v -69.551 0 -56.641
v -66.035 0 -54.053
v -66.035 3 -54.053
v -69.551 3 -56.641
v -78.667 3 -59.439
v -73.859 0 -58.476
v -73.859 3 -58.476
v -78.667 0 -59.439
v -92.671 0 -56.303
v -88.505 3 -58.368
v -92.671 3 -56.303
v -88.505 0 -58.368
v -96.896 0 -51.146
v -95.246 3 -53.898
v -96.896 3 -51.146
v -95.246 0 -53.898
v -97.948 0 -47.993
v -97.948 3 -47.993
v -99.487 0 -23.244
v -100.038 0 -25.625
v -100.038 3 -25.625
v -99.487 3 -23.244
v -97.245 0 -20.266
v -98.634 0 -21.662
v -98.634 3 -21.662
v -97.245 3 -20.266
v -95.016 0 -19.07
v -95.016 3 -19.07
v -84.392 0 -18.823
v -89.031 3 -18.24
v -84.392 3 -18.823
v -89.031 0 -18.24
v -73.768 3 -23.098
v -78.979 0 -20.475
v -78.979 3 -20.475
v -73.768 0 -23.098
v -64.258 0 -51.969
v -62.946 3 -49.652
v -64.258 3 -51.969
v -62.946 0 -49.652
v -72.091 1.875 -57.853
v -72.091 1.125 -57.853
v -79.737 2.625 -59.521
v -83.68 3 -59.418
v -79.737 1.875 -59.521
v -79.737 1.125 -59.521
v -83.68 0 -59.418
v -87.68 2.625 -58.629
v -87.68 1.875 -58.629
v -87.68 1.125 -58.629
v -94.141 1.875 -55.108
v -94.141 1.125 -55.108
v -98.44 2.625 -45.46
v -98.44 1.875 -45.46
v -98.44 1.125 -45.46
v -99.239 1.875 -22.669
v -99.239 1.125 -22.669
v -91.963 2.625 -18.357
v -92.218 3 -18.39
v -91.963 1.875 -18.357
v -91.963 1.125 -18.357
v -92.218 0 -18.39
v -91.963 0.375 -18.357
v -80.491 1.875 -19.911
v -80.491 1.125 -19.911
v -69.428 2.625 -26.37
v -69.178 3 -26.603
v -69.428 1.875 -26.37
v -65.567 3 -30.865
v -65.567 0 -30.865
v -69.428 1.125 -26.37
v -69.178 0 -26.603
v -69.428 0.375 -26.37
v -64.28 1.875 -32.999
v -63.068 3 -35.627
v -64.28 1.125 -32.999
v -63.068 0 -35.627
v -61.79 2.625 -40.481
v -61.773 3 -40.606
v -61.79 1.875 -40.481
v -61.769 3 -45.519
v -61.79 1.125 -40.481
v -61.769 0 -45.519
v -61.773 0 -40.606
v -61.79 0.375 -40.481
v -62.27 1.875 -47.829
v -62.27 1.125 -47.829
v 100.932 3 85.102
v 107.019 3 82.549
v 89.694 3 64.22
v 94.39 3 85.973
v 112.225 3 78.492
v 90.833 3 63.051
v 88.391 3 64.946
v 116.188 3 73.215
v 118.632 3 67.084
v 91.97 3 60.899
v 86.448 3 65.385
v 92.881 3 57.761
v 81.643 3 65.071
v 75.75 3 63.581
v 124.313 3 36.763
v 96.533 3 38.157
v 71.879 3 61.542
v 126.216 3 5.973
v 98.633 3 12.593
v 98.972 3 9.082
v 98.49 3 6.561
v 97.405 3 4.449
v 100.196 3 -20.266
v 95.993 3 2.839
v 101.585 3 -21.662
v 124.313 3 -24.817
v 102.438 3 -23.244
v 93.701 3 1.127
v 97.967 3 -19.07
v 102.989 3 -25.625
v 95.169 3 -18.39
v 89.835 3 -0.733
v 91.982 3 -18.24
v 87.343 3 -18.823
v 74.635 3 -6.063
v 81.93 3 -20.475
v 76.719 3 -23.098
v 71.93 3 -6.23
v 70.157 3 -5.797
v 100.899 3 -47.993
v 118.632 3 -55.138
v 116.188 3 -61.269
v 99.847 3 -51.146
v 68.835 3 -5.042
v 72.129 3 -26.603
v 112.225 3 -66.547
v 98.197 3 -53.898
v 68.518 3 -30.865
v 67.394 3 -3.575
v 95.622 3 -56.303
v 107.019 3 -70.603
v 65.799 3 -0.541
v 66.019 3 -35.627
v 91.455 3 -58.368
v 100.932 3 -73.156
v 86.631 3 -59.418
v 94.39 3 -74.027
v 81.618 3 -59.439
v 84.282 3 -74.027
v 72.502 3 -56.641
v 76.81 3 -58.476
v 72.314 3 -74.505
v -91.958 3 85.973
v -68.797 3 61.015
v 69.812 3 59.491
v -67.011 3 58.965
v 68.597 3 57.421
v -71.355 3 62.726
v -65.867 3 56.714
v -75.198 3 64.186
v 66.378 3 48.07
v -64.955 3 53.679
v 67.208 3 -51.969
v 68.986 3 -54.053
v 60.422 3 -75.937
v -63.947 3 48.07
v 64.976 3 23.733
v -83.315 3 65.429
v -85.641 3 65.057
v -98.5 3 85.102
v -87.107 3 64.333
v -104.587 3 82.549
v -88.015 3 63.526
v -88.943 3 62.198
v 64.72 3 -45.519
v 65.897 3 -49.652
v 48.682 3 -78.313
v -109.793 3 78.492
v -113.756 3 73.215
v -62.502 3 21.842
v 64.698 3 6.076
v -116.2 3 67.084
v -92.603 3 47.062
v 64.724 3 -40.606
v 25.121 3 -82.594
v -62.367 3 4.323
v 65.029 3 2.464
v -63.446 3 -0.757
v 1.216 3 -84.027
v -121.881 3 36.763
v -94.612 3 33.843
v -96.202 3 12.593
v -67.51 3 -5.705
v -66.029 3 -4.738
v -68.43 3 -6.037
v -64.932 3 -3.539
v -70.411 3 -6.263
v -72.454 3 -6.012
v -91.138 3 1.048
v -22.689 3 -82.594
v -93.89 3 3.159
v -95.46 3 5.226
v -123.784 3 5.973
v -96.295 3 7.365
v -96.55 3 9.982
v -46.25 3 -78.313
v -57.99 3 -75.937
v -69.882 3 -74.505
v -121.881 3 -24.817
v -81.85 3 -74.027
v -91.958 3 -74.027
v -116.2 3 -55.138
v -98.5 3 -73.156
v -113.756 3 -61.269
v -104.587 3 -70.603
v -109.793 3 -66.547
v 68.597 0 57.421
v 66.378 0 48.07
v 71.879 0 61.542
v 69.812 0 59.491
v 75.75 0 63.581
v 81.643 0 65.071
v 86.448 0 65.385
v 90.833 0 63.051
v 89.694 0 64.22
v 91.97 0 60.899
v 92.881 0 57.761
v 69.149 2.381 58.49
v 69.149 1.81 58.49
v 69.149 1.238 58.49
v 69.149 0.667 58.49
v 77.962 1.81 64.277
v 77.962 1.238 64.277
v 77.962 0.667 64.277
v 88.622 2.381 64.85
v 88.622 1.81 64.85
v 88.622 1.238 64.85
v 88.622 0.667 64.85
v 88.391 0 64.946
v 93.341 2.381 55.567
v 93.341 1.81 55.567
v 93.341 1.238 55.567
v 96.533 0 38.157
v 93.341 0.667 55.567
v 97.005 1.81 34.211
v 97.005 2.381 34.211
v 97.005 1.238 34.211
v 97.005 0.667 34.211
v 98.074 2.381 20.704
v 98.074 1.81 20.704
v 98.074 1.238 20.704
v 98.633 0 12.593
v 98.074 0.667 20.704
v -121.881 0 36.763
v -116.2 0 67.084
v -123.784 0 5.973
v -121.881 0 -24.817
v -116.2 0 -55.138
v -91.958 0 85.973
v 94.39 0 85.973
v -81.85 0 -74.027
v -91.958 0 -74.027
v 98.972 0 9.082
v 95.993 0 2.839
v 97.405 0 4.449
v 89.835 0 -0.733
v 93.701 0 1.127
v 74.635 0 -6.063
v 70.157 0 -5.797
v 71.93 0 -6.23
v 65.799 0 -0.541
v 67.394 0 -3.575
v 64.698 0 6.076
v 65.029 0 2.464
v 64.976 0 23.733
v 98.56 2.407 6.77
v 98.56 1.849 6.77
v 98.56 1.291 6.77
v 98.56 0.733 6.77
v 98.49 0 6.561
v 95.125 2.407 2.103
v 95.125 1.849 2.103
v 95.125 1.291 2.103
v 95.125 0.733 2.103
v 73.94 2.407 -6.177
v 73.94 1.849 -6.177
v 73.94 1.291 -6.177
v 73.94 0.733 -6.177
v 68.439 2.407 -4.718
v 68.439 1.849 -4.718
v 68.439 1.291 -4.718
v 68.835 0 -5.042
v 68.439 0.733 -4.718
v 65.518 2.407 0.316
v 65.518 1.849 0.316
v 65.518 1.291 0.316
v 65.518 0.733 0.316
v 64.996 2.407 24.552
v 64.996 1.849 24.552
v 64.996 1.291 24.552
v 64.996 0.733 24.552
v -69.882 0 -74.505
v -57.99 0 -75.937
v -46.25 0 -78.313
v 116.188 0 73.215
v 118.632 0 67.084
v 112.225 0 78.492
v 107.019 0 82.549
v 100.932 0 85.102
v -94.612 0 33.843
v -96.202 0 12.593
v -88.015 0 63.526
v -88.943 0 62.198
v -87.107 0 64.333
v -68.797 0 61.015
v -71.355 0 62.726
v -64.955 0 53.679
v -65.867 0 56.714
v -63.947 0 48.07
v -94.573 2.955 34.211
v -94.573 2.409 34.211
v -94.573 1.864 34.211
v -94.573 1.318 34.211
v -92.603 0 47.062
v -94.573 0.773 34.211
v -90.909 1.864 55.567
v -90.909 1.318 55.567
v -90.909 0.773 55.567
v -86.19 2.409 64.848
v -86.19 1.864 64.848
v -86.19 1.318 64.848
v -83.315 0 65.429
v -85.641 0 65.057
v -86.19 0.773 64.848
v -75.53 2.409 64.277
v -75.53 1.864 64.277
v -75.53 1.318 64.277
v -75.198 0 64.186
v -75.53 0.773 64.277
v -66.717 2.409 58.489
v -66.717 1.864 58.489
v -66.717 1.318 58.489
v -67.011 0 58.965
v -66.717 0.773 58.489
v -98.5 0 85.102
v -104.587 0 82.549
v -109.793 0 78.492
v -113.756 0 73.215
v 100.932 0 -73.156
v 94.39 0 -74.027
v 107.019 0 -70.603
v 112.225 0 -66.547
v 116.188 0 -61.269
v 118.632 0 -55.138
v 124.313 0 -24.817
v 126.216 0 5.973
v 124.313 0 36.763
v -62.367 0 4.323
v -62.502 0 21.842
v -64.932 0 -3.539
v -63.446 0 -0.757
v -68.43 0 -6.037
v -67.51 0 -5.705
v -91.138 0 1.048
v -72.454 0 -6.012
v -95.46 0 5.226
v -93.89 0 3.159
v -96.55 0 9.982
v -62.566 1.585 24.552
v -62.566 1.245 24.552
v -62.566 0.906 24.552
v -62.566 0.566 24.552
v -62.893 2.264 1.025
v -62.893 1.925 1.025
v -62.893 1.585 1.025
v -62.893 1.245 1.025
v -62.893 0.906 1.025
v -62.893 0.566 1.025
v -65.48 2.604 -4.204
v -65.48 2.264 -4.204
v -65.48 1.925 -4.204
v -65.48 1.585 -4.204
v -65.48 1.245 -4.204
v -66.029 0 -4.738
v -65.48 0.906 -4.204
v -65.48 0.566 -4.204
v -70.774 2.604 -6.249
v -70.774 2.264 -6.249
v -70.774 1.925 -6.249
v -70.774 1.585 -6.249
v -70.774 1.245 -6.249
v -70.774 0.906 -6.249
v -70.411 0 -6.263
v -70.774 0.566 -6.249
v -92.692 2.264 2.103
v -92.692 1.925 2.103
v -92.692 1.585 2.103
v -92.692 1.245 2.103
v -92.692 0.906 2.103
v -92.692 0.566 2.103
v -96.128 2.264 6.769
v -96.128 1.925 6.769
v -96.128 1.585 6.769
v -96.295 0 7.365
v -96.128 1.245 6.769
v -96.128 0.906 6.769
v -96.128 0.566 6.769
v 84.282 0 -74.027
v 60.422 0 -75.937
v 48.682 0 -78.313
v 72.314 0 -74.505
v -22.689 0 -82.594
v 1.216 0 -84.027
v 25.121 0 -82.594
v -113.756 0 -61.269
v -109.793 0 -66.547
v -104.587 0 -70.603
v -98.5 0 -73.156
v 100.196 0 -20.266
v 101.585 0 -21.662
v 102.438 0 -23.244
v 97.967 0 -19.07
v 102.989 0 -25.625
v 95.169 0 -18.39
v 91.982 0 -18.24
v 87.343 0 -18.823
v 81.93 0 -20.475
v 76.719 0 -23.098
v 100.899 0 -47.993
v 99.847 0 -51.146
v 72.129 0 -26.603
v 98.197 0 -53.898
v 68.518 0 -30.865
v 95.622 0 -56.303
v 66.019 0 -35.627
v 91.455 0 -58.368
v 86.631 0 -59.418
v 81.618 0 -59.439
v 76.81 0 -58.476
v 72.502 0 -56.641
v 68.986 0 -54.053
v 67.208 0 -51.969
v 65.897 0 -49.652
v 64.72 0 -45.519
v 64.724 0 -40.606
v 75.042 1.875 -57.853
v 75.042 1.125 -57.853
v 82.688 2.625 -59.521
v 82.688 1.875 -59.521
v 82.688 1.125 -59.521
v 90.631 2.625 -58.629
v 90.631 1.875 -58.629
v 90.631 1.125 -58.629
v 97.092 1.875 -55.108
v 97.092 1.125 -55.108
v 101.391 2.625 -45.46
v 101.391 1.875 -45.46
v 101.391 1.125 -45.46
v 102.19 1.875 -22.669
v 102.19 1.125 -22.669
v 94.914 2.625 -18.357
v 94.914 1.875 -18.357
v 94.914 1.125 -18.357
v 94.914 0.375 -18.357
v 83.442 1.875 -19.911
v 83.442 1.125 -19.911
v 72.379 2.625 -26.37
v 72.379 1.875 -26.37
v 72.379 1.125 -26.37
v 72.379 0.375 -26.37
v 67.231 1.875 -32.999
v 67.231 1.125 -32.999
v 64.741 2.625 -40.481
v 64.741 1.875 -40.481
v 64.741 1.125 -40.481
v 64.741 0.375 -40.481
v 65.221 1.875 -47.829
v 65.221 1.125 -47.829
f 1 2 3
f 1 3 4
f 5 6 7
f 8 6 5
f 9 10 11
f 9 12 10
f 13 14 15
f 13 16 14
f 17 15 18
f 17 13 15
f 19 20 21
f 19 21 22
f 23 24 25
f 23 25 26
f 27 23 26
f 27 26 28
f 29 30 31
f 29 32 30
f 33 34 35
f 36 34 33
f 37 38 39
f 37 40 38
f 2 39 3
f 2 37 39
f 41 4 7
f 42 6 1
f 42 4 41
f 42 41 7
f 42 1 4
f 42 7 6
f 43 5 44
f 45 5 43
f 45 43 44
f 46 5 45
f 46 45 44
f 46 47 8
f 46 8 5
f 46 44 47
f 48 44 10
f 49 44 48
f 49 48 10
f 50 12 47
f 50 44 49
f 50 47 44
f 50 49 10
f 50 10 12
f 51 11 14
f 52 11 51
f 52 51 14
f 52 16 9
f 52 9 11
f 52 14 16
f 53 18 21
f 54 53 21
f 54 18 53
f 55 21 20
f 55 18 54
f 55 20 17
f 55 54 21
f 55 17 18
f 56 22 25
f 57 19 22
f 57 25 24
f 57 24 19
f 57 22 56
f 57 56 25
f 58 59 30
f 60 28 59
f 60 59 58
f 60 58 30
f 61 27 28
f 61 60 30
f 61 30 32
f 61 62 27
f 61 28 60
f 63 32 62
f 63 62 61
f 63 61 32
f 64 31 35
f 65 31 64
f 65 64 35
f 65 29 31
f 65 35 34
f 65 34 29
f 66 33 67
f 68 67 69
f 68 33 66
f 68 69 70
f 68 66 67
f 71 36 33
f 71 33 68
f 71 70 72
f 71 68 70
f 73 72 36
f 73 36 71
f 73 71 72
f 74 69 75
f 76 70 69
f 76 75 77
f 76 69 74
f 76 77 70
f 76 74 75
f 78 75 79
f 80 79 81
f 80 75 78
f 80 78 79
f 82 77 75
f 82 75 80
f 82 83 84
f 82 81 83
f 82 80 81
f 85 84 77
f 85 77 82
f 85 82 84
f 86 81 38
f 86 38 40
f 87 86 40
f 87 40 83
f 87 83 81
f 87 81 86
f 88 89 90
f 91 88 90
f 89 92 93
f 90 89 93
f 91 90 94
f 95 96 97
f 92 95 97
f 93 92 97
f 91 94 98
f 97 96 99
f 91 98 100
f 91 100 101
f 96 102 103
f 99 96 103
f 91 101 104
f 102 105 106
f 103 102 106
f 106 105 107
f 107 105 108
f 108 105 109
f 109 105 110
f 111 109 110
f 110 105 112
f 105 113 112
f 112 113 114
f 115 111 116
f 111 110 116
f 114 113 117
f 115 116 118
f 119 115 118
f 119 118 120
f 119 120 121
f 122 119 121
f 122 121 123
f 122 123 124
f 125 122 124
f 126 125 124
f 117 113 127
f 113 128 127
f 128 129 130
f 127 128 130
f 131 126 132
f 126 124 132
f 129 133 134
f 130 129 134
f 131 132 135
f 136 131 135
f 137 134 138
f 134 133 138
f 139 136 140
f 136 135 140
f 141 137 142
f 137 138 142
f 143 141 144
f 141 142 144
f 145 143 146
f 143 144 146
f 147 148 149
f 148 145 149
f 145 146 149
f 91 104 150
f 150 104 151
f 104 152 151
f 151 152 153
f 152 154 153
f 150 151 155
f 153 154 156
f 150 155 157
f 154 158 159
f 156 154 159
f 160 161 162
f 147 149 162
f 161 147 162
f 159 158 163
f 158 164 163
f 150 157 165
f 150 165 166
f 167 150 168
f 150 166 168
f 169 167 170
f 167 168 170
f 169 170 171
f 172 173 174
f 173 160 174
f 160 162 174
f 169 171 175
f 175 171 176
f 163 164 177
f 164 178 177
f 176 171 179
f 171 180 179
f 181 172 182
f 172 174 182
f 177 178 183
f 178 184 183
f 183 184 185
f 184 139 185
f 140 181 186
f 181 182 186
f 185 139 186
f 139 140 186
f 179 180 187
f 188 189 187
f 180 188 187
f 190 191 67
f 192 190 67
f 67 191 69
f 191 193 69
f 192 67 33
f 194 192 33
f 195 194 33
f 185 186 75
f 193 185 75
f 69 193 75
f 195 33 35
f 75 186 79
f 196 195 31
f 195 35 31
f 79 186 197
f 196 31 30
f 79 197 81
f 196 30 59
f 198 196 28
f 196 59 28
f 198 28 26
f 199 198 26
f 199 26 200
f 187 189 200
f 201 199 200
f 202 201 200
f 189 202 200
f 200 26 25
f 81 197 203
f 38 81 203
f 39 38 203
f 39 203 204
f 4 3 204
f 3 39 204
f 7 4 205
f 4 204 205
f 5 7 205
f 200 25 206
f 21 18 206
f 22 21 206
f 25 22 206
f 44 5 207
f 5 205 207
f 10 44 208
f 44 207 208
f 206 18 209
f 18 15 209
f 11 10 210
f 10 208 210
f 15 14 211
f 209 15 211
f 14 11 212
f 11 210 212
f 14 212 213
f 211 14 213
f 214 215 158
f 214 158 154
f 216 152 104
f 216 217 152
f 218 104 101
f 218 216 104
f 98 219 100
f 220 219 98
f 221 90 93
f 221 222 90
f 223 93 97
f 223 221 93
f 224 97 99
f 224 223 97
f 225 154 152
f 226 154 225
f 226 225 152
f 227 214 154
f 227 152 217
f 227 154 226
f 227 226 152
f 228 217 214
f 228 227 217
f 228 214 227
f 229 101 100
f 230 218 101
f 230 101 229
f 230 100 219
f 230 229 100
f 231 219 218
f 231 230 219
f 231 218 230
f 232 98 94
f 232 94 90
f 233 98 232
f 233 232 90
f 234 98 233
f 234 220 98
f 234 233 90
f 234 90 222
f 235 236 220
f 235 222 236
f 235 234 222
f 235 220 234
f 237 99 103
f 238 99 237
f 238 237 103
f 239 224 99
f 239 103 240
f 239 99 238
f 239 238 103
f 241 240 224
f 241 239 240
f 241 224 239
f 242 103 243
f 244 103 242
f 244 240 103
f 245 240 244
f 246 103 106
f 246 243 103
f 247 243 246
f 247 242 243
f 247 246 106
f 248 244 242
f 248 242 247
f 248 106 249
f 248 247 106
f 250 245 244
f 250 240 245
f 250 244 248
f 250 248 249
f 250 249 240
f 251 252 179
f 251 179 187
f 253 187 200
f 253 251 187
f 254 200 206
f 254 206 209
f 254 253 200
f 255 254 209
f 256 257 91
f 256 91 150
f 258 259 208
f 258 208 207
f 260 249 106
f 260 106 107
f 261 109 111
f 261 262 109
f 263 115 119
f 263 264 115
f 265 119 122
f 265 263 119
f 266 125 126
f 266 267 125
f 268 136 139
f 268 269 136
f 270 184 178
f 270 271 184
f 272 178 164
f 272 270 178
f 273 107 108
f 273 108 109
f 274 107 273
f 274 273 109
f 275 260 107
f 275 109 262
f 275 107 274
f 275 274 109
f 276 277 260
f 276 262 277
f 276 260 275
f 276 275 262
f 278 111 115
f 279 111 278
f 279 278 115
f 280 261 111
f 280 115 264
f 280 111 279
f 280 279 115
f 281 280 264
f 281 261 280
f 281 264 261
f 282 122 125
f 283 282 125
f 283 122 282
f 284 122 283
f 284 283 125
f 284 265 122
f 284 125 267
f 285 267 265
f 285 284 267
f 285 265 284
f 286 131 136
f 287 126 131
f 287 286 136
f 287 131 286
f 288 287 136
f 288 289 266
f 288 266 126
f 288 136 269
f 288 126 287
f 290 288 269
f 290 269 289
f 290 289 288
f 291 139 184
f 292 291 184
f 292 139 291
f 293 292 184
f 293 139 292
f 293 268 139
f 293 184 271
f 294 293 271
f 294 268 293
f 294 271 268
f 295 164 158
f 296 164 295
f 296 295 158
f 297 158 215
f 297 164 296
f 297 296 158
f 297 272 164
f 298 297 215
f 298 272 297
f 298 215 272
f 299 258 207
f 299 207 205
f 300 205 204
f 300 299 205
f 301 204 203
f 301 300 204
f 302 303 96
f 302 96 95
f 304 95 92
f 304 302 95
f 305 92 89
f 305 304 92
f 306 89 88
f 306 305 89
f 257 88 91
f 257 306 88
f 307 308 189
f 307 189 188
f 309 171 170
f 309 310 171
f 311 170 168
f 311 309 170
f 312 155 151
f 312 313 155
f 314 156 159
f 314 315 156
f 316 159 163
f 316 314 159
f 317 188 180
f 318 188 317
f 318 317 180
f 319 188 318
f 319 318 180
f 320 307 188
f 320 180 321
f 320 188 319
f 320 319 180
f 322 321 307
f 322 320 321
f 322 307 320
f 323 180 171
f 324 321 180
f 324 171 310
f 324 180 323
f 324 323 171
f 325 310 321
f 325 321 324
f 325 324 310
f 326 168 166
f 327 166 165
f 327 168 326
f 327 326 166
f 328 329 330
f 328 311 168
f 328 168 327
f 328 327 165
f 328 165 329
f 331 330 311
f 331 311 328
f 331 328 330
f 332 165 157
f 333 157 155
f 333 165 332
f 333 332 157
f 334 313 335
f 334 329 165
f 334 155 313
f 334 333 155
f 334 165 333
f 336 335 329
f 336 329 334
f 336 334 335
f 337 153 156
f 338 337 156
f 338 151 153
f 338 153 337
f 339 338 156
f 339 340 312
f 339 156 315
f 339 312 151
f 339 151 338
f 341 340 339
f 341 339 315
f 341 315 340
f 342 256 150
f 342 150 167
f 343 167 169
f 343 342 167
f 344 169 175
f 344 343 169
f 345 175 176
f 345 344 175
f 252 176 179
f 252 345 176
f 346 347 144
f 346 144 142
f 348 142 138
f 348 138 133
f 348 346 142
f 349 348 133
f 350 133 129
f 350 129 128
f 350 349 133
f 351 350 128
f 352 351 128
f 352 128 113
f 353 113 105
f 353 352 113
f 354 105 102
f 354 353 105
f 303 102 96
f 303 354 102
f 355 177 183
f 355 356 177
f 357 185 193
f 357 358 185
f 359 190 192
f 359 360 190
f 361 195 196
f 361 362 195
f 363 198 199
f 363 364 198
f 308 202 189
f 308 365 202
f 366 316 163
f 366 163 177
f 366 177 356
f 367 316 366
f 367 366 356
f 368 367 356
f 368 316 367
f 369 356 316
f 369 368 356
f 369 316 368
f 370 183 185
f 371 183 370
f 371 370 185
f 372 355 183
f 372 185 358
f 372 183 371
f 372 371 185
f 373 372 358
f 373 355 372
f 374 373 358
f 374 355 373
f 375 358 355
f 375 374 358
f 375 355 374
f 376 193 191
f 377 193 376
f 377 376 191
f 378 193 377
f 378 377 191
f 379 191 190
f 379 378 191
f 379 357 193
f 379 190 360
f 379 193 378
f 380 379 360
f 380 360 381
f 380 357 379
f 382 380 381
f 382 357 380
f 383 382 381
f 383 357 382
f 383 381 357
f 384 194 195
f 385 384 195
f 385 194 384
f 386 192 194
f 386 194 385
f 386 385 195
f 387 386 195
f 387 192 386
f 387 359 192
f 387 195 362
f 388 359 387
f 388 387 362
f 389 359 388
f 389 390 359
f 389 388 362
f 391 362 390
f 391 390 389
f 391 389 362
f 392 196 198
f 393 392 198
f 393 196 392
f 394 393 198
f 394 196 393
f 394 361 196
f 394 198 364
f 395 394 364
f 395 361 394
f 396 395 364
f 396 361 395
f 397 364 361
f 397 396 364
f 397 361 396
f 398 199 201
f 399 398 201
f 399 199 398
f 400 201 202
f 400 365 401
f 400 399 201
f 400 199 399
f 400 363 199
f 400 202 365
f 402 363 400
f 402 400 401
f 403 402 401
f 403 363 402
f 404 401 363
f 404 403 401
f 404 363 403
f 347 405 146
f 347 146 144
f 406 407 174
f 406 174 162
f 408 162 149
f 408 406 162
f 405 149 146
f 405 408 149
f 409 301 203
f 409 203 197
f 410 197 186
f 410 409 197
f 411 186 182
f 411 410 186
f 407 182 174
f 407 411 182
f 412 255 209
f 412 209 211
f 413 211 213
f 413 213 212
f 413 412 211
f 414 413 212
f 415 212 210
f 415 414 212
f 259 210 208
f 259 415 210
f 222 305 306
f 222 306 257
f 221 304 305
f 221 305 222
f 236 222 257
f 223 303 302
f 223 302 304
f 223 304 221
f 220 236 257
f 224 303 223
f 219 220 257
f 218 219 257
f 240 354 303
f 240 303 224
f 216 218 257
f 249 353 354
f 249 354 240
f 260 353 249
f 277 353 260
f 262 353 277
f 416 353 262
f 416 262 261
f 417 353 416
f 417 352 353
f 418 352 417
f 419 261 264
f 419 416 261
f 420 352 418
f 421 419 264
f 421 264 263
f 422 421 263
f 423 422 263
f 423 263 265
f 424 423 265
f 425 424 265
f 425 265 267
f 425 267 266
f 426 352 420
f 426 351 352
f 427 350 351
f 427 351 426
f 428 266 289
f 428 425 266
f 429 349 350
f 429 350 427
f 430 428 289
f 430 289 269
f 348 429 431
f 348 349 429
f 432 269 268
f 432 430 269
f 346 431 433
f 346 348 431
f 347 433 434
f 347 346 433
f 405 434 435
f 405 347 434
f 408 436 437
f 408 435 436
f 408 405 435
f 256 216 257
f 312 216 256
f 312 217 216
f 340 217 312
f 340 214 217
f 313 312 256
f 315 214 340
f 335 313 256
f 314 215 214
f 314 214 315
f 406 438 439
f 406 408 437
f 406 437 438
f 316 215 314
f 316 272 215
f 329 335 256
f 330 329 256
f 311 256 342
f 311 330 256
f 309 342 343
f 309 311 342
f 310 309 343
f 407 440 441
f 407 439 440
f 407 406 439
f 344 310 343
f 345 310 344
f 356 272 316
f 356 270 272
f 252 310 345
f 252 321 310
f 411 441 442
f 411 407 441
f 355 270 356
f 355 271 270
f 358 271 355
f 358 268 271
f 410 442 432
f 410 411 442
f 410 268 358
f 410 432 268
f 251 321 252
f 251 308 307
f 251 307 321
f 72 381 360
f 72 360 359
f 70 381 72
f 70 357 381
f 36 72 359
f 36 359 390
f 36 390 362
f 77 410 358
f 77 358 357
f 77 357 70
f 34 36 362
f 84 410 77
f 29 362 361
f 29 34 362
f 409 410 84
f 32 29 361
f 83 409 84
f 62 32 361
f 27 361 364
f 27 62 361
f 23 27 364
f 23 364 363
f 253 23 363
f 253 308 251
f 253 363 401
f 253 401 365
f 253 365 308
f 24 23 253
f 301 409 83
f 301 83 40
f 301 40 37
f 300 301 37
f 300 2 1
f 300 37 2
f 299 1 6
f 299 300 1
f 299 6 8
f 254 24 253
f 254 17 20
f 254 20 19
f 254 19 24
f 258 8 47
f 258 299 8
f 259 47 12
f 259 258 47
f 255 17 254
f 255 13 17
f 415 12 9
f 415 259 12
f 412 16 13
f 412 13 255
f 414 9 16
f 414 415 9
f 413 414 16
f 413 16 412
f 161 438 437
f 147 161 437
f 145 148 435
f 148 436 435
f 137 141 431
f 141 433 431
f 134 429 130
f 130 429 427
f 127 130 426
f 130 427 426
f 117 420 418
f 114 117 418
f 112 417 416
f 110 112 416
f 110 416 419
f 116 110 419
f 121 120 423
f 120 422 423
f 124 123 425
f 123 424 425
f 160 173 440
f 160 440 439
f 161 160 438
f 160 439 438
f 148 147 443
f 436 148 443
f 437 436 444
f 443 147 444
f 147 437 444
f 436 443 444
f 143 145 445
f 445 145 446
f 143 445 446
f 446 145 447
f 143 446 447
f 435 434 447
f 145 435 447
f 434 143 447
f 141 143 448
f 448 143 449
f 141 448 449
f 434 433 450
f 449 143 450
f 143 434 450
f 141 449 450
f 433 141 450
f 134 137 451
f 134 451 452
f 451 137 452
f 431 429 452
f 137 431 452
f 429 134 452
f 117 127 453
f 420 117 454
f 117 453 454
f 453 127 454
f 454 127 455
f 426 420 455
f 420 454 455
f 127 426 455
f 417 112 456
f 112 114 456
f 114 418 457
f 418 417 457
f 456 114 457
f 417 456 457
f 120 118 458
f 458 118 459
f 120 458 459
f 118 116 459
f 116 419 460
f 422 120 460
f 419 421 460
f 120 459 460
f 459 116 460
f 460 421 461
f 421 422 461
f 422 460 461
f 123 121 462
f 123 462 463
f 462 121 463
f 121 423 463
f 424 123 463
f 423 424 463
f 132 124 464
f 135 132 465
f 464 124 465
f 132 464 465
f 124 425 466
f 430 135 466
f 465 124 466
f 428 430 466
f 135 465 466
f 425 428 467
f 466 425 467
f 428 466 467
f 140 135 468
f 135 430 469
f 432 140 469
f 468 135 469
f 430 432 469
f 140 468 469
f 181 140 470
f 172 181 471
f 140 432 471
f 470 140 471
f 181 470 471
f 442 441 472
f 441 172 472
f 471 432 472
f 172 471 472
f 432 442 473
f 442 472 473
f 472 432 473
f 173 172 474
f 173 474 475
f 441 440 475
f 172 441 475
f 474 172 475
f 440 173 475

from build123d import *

# Parameters (mm, degrees)
EXTRUDE_1_DEPTH = 3


with BuildPart() as part:
    # 草图1 → 凸台-拉伸1 (new body)
    with BuildSketch(Plane(origin=(0, 0, 0), x_dir=(1, 0, 0), z_dir=(0, 1, 0))):
        with BuildLine():
            Line((94.390177013, -85.972747776), (-91.958307572, -85.972747776))
            ThreePointArc((-91.958307572, -85.972747776), (-107.324215001, -80.693013719), (-116.199890049, -67.083858887))
            ThreePointArc((-116.199890049, -67.083858887), (-123.784065285, -5.972747771), (-116.199890058, 55.138363346))
            ThreePointArc((-116.199890058, 55.138363346), (-107.32421501, 68.747518179), (-91.958307581, 74.027252235))
            Line((-91.958307581, 74.027252235), (-81.850303918, 74.027252235))
            ThreePointArc((-81.850303918, 74.027252235), (-63.921874778, 75.102534916), (-46.250487363, 78.312966521))
            ThreePointArc((-46.250487363, 78.312966521), (1.215934711, 84.027252235), (48.682356785, 78.312966521))
            ThreePointArc((48.682356785, 78.312966521), (66.3537442, 75.102534916), (84.28217334, 74.027252235))
            Line((84.28217334, 74.027252235), (94.390177004, 74.027252235))
            ThreePointArc((94.390177004, 74.027252235), (109.756084433, 68.747518179), (118.631759481, 55.138363346))
            ThreePointArc((118.631759481, 55.138363346), (126.215934711, -5.972747765), (118.631759481, -67.083858876))
            ThreePointArc((118.631759481, -67.083858876), (109.756084439, -80.693013712), (94.390177013, -85.972747776))
        make_face()
        with BuildLine():
            add(Edge.make_bspline(
                [(68.986094853, 54.052880458), (72.433395849, 57.388665861), (82.880244638, 61.328816288), (95.372381615, 57.69301042), (102.184326446, 48.730593852), (101.625647104, 38.780320493), (103.363913249, 27.479369986), (102.122981057, 14.490364998), (66.281132782, 20.580692387), (61.637655085, 46.942152926), (68.986094853, 54.052880458)],
                knots=[0, 0, 0, 0, 0.116915593, 0.219737231, 0.248390104, 0.38621607, 0.411540017, 0.484401326, 0.750776855, 1, 1, 1, 1], degree=3))
        make_face(mode=Mode.SUBTRACT)
        with BuildLine():
            add(Edge.make_bspline(
                [(-66.035121605, 54.052880458), (-69.482422601, 57.388665861), (-79.92927139, 61.328816288), (-92.421408367, 57.69301042), (-99.233353198, 48.730593852), (-98.674673857, 38.780320493), (-100.412940001, 27.479369986), (-99.17200781, 14.490364998), (-63.330159534, 20.580692387), (-58.686681838, 46.942152926), (-66.035121605, 54.052880458)],
                knots=[0, 0, 0, 0, 0.116915593, 0.219737231, 0.248390104, 0.38621607, 0.411540017, 0.484401326, 0.750776855, 1, 1, 1, 1], degree=3))
        make_face(mode=Mode.SUBTRACT)
        with BuildLine():
            add(Edge.make_bspline(
                [(66.378392316, -48.070354103), (66.513141004, -48.963867831), (66.784541184, -50.75067783), (67.206568019, -52.969669789), (67.638075057, -54.726079503), (68.028528116, -56.02627659), (68.514673647, -57.292693044), (69.12483392, -58.503698266), (69.877962185, -59.629683626), (70.780887624, -60.639960695), (71.638376045, -61.375995808), (72.373040628, -61.901406728), (72.944965724, -62.264959486), (73.53450138, -62.599334396), (74.138719009, -62.906182598), (74.755292003, -63.187445614), (75.382145547, -63.445111968), (76.017512525, -63.681173008), (76.874078736, -63.969734643), (77.959407285, -64.286084635), (79.057111498, -64.556052349), (79.940055415, -64.749685469), (80.60444556, -64.884305484), (81.270782263, -65.008820837), (82.161869772, -65.160128895), (83.05718589, -65.286816255), (83.956880014, -65.377639436), (84.633616492, -65.423491866), (85.311598155, -65.44160392), (85.989685456, -65.425715556), (86.666176397, -65.369075307), (87.336085397, -65.262804646), (87.992548189, -65.097170551), (88.627252742, -64.86279042), (89.229311344, -64.552451953), (89.693415023, -64.231076156), (90.037641849, -63.939849012), (90.363037091, -63.627638911), (90.881751466, -63.031207555), (91.480525034, -62.066993636), (92.022062013, -60.822932679), (92.440354572, -59.531839315), (92.782069694, -58.219705754), (93.075261947, -56.896207294), (93.298097785, -55.788853885), (93.471085542, -54.902094117), (93.599412547, -54.236790927), (93.727568, -53.571492843), (93.899452413, -52.684660983), (94.117652758, -51.576812929), (94.475355345, -49.805934491), (94.930957408, -47.593960223), (95.455728051, -44.935300858), (95.929789785, -42.267296624), (96.344437503, -39.589592448), (96.702919776, -36.903948874), (96.98610925, -34.436257166), (97.16694213, -32.638786984), (97.314125211, -31.064933561), (97.529036862, -28.590183453), (97.793354214, -24.986157596), (98.043992656, -21.154725637), (98.251262668, -17.999649107), (98.438616168, -15.296150739), (98.568557404, -13.494232318), (98.633484504, -12.593270199)],
                knots=[0, 0, 0, 0, 0.03125, 0.0625, 0.078125, 0.09375, 0.109375, 0.125, 0.140625, 0.15625, 0.171875, 0.1796875, 0.1875, 0.1953125, 0.203125, 0.2109375, 0.21875, 0.2265625, 0.234375, 0.25, 0.265625, 0.2734375, 0.28125, 0.2890625, 0.296875, 0.3125, 0.3203125, 0.328125, 0.3359375, 0.34375, 0.3515625, 0.359375, 0.3671875, 0.375, 0.3828125, 0.390625, 0.39453125, 0.3984375, 0.40625, 0.421875, 0.4375, 0.453125, 0.46875, 0.484375, 0.5, 0.5078125, 0.515625, 0.5234375, 0.53125, 0.546875, 0.5625, 0.59375, 0.625, 0.65625, 0.6875, 0.71875, 0.75, 0.7734375, 0.78125, 0.8046875, 0.859375, 0.90625, 0.9375, 0.96875, 1, 1, 1, 1], degree=3))
            add(Edge.make_bspline(
                [(98.633484504, -12.593270199), (98.657985111, -12.472892573), (98.706820606, -12.23210357), (98.799099674, -11.749445327), (98.931985496, -10.899002555), (99.001933616, -9.916016728), (98.97260714, -8.934286342), (98.896300721, -8.201600799), (98.762623973, -7.477218868), (98.56957272, -6.76661966), (98.316390555, -6.075357544), (97.899678578, -5.187177565), (96.969828829, -3.736775346), (95.545230116, -2.361156946), (93.927547805, -1.241695609), (92.646788117, -0.510236318), (91.319007458, 0.129190807), (89.959150997, 0.695054189), (88.577232455, 1.207990753), (87.414975152, 1.609013485), (86.483345821, 1.924592969), (85.784837369, 2.161289088), (85.203755813, 2.360693358), (84.739835794, 2.522449181), (84.276553588, 2.685755162), (83.698707684, 2.89301636), (83.122653692, 3.104914262), (82.662920435, 3.277389548), (82.203873819, 3.451711074), (81.63119511, 3.672688204), (80.945146212, 3.941186427), (80.259577338, 4.211314192), (79.573613974, 4.480894382), (78.886245155, 4.747369331), (78.196417083, 5.007999708), (77.502929667, 5.258679877), (76.804557557, 5.494630383), (76.100158372, 5.710760553), (75.388552891, 5.902000242), (74.668845314, 6.062546145), (74.061948263, 6.164355764), (73.573352673, 6.221816886), (73.205898511, 6.251584554), (72.837900997, 6.266730728), (72.469873973, 6.26595239), (72.102471256, 6.247959166), (71.736554191, 6.211509461), (71.373199555, 6.15547756), (70.893765336, 6.053354614), (70.307282101, 5.872253565), (69.635514076, 5.56946821), (68.796973117, 5.057451206), (67.880229355, 4.233066104), (67.13475439, 3.249835897), (66.630113019, 2.407609036), (66.294245293, 1.751524611), (65.997818744, 1.076785848), (65.737939883, 0.387504717), (65.512580032, -0.313883458), (65.319771043, -1.02511209), (65.157541005, -1.743856743), (65.023850529, -2.468040417), (64.916333275, -3.196288356), (64.804309535, -4.171599232), (64.733894922, -5.151768718), (64.694087494, -6.134366581), (64.676771107, -6.871938024), (64.669269608, -7.609580904), (64.669178244, -8.347068642), (64.674290603, -9.084310275), (64.682864838, -9.821310558), (64.693630888, -10.558134013), (64.709901763, -11.540405223), (64.73220076, -12.768108154), (64.808922539, -16.696453647), (64.901377775, -20.623994263), (64.996175571, -24.551668052), (65.038072838, -26.270040467), (65.074673162, -27.742942063), (65.112448548, -29.21583789), (65.157794385, -30.934206887), (65.228429614, -33.388919367), (65.340799215, -36.333766197), (65.497804683, -39.276699271), (65.713048905, -42.215507279), (65.951668804, -44.659299476), (66.185241653, -46.609671079), (66.314040573, -47.583455865), (66.378392316, -48.070354103)],
                knots=[0, 0, 0, 0, 0.00390625, 0.0078125, 0.015625, 0.03125, 0.0390625, 0.046875, 0.0546875, 0.0625, 0.0703125, 0.078125, 0.09375, 0.125, 0.140625, 0.15625, 0.171875, 0.1875, 0.203125, 0.21875, 0.2265625, 0.234375, 0.2421875, 0.24609375, 0.25, 0.2578125, 0.265625, 0.26953125, 0.2734375, 0.28125, 0.2890625, 0.296875, 0.3046875, 0.3125, 0.3203125, 0.328125, 0.3359375, 0.34375, 0.3515625, 0.359375, 0.3671875, 0.37109375, 0.375, 0.37890625, 0.3828125, 0.38671875, 0.390625, 0.39453125, 0.3984375, 0.40625, 0.4140625, 0.421875, 0.4375, 0.453125, 0.4609375, 0.46875, 0.4765625, 0.484375, 0.4921875, 0.5, 0.5078125, 0.515625, 0.5234375, 0.53125, 0.546875, 0.5546875, 0.5625, 0.5703125, 0.578125, 0.5859375, 0.59375, 0.6015625, 0.609375, 0.625, 0.640625, 0.734375, 0.75, 0.765625, 0.7890625, 0.796875, 0.8125, 0.84375, 0.875, 0.90625, 0.9375, 0.96875, 0.984375, 1, 1, 1, 1], degree=3))
        make_face(mode=Mode.SUBTRACT)
        with BuildLine():
            add(Edge.make_bspline(
                [(-96.201615166, -12.593269941), (-96.070479827, -14.395110275), (-95.81179536, -17.999047188), (-95.467624919, -23.408041446), (-95.089189756, -28.81576773), (-94.602184559, -34.214050071), (-94.050254422, -38.696842114), (-93.49679355, -42.26711137), (-93.023761844, -44.935327257), (-92.58710182, -47.150983981), (-92.226330643, -48.921268225), (-91.954591494, -50.248763824), (-91.686236481, -51.576918199), (-91.424283732, -52.906333901), (-91.167337328, -54.236786656), (-90.953591977, -55.345669912), (-90.777016062, -56.231698069), (-90.639997302, -56.895301467), (-90.496145933, -57.557478372), (-90.342969695, -58.21763211), (-90.17802148, -58.875188612), (-89.998249684, -59.529257617), (-89.832302377, -60.069858215), (-89.687070055, -60.498243743), (-89.532537681, -60.923316382), (-89.320040372, -61.44726789), (-89.027601768, -62.059080721), (-88.690851661, -62.647251995), (-88.367731363, -63.109784406), (-88.08076087, -63.457630347), (-87.850939676, -63.705827916), (-87.606548475, -63.939702832), (-87.348029223, -64.157765345), (-87.076161358, -64.358740649), (-86.697190599, -64.602539108), (-86.19567556, -64.860364929), (-85.560997522, -65.095437775), (-84.685589451, -65.31779053), (-83.55826729, -65.445774099), (-82.199841254, -65.434916075), (-80.8485755, -65.314875278), (-79.506093517, -65.127543311), (-78.394149482, -64.928853573), (-77.508327306, -64.748905044), (-76.625029788, -64.55584433), (-75.746707045, -64.340578419), (-74.876176655, -64.096732998), (-74.227965734, -63.897921481), (-73.585563188, -63.681311466), (-72.950121421, -63.445023478), (-72.323065752, -63.187116947), (-71.500499657, -62.811782162), (-70.503122094, -62.278913749), (-69.377649483, -61.522882796), (-68.348758122, -60.640003641), (-67.596811564, -59.79815054), (-67.069594949, -59.066553358), (-66.591133746, -58.301676856), (-66.18458179, -57.49451641), (-65.840735151, -56.659340397), (-65.610352744, -56.021586113), (-65.403707451, -55.375066098), (-65.154770258, -54.504838893), (-64.883922625, -53.407744612), (-64.606682584, -52.08157666), (-64.36498242, -50.7484663), (-64.14849407, -49.410640149), (-64.013789343, -48.517125174), (-63.946522993, -48.070353987)],
                knots=[0, 0, 0, 0, 0.0625, 0.125, 0.1875, 0.25, 0.3125, 0.34375, 0.375, 0.40625, 0.421875, 0.4375, 0.453125, 0.46875, 0.484375, 0.5, 0.5078125, 0.515625, 0.5234375, 0.53125, 0.5390625, 0.546875, 0.5546875, 0.55859375, 0.5625, 0.5703125, 0.578125, 0.5859375, 0.59375, 0.59765625, 0.6015625, 0.60546875, 0.609375, 0.61328125, 0.6171875, 0.625, 0.6328125, 0.640625, 0.65625, 0.671875, 0.6875, 0.703125, 0.71875, 0.7265625, 0.734375, 0.75, 0.7578125, 0.765625, 0.7734375, 0.78125, 0.7890625, 0.796875, 0.8125, 0.828125, 0.84375, 0.859375, 0.8671875, 0.875, 0.890625, 0.8984375, 0.90625, 0.9140625, 0.921875, 0.9375, 0.953125, 0.96875, 0.984375, 1, 1, 1, 1], degree=3))
            add(Edge.make_bspline(
                [(-63.946522993, -48.070353987), (-63.681896242, -46.12372925), (-63.232969834, -42.219548423), (-62.951592742, -37.314637681), (-62.798836103, -33.388898798), (-62.683586676, -29.46136706), (-62.566086204, -24.551578619), (-62.425460226, -18.659892586), (-62.31841739, -13.750035035), (-62.25629846, -10.31269127), (-62.236082135, -8.347650384), (-62.242233066, -6.381226298), (-62.326300728, -4.416330115), (-62.57867879, -2.46642638), (-62.823431788, -1.261393442), (-63.080257674, -0.312696571), (-63.305446751, 0.388812943), (-63.565302742, 1.077995557), (-63.862015123, 1.752164382), (-64.14204485, 2.298578093), (-64.38714603, 2.724289313), (-64.646801655, 3.141511417), (-64.999688904, 3.645164395), (-65.941206177, 4.780412563), (-67.372168299, 5.805308786), (-69.300086911, 6.259577003), (-70.775848063, 6.287824274), (-71.996915967, 6.116350193), (-72.956531647, 5.901852901), (-73.66816223, 5.70965627), (-74.372596211, 5.492648679), (-75.070993714, 5.256309618), (-75.764549617, 5.006007057), (-76.684547046, 4.660072197), (-77.828408726, 4.212764331), (-79.198769308, 3.671266982), (-80.574350905, 3.144008122), (-82.419712578, 2.471117671), (-84.284080179, 1.847874803), (-86.144334522, 1.207099184), (-87.526984368, 0.694391918), (-88.887136841, 0.12897263), (-90.214512332, -0.510213084), (-91.49435078, -1.241400867), (-92.708002967, -2.08188344), (-93.824343229, -3.048154657), (-95.134608842, -4.518008077), (-96.06225963, -6.27380222), (-96.492630986, -8.197202264), (-96.572557219, -9.424958977), (-96.536984177, -10.408447049), (-96.476642656, -11.02056807), (-96.407345023, -11.507295343), (-96.324867487, -11.99171323), (-96.251498435, -12.352766664), (-96.201615166, -12.593269941)],
                knots=[0, 0, 0, 0, 0.0625, 0.125, 0.15625, 0.1875, 0.25, 0.3125, 0.375, 0.40625, 0.421875, 0.4375, 0.46875, 0.484375, 0.5, 0.5078125, 0.515625, 0.5234375, 0.53125, 0.5390625, 0.54296875, 0.546875, 0.5546875, 0.5625, 0.59375, 0.609375, 0.625, 0.640625, 0.6484375, 0.65625, 0.6640625, 0.671875, 0.6796875, 0.6875, 0.703125, 0.71875, 0.734375, 0.75, 0.78125, 0.796875, 0.8125, 0.828125, 0.84375, 0.859375, 0.875, 0.890625, 0.90625, 0.9375, 0.953125, 0.96875, 0.9765625, 0.984375, 0.98828125, 0.9921875, 1, 1, 1, 1], degree=3))
        make_face(mode=Mode.SUBTRACT)
    extrude(amount=EXTRUDE_1_DEPTH)


solid = part.part
